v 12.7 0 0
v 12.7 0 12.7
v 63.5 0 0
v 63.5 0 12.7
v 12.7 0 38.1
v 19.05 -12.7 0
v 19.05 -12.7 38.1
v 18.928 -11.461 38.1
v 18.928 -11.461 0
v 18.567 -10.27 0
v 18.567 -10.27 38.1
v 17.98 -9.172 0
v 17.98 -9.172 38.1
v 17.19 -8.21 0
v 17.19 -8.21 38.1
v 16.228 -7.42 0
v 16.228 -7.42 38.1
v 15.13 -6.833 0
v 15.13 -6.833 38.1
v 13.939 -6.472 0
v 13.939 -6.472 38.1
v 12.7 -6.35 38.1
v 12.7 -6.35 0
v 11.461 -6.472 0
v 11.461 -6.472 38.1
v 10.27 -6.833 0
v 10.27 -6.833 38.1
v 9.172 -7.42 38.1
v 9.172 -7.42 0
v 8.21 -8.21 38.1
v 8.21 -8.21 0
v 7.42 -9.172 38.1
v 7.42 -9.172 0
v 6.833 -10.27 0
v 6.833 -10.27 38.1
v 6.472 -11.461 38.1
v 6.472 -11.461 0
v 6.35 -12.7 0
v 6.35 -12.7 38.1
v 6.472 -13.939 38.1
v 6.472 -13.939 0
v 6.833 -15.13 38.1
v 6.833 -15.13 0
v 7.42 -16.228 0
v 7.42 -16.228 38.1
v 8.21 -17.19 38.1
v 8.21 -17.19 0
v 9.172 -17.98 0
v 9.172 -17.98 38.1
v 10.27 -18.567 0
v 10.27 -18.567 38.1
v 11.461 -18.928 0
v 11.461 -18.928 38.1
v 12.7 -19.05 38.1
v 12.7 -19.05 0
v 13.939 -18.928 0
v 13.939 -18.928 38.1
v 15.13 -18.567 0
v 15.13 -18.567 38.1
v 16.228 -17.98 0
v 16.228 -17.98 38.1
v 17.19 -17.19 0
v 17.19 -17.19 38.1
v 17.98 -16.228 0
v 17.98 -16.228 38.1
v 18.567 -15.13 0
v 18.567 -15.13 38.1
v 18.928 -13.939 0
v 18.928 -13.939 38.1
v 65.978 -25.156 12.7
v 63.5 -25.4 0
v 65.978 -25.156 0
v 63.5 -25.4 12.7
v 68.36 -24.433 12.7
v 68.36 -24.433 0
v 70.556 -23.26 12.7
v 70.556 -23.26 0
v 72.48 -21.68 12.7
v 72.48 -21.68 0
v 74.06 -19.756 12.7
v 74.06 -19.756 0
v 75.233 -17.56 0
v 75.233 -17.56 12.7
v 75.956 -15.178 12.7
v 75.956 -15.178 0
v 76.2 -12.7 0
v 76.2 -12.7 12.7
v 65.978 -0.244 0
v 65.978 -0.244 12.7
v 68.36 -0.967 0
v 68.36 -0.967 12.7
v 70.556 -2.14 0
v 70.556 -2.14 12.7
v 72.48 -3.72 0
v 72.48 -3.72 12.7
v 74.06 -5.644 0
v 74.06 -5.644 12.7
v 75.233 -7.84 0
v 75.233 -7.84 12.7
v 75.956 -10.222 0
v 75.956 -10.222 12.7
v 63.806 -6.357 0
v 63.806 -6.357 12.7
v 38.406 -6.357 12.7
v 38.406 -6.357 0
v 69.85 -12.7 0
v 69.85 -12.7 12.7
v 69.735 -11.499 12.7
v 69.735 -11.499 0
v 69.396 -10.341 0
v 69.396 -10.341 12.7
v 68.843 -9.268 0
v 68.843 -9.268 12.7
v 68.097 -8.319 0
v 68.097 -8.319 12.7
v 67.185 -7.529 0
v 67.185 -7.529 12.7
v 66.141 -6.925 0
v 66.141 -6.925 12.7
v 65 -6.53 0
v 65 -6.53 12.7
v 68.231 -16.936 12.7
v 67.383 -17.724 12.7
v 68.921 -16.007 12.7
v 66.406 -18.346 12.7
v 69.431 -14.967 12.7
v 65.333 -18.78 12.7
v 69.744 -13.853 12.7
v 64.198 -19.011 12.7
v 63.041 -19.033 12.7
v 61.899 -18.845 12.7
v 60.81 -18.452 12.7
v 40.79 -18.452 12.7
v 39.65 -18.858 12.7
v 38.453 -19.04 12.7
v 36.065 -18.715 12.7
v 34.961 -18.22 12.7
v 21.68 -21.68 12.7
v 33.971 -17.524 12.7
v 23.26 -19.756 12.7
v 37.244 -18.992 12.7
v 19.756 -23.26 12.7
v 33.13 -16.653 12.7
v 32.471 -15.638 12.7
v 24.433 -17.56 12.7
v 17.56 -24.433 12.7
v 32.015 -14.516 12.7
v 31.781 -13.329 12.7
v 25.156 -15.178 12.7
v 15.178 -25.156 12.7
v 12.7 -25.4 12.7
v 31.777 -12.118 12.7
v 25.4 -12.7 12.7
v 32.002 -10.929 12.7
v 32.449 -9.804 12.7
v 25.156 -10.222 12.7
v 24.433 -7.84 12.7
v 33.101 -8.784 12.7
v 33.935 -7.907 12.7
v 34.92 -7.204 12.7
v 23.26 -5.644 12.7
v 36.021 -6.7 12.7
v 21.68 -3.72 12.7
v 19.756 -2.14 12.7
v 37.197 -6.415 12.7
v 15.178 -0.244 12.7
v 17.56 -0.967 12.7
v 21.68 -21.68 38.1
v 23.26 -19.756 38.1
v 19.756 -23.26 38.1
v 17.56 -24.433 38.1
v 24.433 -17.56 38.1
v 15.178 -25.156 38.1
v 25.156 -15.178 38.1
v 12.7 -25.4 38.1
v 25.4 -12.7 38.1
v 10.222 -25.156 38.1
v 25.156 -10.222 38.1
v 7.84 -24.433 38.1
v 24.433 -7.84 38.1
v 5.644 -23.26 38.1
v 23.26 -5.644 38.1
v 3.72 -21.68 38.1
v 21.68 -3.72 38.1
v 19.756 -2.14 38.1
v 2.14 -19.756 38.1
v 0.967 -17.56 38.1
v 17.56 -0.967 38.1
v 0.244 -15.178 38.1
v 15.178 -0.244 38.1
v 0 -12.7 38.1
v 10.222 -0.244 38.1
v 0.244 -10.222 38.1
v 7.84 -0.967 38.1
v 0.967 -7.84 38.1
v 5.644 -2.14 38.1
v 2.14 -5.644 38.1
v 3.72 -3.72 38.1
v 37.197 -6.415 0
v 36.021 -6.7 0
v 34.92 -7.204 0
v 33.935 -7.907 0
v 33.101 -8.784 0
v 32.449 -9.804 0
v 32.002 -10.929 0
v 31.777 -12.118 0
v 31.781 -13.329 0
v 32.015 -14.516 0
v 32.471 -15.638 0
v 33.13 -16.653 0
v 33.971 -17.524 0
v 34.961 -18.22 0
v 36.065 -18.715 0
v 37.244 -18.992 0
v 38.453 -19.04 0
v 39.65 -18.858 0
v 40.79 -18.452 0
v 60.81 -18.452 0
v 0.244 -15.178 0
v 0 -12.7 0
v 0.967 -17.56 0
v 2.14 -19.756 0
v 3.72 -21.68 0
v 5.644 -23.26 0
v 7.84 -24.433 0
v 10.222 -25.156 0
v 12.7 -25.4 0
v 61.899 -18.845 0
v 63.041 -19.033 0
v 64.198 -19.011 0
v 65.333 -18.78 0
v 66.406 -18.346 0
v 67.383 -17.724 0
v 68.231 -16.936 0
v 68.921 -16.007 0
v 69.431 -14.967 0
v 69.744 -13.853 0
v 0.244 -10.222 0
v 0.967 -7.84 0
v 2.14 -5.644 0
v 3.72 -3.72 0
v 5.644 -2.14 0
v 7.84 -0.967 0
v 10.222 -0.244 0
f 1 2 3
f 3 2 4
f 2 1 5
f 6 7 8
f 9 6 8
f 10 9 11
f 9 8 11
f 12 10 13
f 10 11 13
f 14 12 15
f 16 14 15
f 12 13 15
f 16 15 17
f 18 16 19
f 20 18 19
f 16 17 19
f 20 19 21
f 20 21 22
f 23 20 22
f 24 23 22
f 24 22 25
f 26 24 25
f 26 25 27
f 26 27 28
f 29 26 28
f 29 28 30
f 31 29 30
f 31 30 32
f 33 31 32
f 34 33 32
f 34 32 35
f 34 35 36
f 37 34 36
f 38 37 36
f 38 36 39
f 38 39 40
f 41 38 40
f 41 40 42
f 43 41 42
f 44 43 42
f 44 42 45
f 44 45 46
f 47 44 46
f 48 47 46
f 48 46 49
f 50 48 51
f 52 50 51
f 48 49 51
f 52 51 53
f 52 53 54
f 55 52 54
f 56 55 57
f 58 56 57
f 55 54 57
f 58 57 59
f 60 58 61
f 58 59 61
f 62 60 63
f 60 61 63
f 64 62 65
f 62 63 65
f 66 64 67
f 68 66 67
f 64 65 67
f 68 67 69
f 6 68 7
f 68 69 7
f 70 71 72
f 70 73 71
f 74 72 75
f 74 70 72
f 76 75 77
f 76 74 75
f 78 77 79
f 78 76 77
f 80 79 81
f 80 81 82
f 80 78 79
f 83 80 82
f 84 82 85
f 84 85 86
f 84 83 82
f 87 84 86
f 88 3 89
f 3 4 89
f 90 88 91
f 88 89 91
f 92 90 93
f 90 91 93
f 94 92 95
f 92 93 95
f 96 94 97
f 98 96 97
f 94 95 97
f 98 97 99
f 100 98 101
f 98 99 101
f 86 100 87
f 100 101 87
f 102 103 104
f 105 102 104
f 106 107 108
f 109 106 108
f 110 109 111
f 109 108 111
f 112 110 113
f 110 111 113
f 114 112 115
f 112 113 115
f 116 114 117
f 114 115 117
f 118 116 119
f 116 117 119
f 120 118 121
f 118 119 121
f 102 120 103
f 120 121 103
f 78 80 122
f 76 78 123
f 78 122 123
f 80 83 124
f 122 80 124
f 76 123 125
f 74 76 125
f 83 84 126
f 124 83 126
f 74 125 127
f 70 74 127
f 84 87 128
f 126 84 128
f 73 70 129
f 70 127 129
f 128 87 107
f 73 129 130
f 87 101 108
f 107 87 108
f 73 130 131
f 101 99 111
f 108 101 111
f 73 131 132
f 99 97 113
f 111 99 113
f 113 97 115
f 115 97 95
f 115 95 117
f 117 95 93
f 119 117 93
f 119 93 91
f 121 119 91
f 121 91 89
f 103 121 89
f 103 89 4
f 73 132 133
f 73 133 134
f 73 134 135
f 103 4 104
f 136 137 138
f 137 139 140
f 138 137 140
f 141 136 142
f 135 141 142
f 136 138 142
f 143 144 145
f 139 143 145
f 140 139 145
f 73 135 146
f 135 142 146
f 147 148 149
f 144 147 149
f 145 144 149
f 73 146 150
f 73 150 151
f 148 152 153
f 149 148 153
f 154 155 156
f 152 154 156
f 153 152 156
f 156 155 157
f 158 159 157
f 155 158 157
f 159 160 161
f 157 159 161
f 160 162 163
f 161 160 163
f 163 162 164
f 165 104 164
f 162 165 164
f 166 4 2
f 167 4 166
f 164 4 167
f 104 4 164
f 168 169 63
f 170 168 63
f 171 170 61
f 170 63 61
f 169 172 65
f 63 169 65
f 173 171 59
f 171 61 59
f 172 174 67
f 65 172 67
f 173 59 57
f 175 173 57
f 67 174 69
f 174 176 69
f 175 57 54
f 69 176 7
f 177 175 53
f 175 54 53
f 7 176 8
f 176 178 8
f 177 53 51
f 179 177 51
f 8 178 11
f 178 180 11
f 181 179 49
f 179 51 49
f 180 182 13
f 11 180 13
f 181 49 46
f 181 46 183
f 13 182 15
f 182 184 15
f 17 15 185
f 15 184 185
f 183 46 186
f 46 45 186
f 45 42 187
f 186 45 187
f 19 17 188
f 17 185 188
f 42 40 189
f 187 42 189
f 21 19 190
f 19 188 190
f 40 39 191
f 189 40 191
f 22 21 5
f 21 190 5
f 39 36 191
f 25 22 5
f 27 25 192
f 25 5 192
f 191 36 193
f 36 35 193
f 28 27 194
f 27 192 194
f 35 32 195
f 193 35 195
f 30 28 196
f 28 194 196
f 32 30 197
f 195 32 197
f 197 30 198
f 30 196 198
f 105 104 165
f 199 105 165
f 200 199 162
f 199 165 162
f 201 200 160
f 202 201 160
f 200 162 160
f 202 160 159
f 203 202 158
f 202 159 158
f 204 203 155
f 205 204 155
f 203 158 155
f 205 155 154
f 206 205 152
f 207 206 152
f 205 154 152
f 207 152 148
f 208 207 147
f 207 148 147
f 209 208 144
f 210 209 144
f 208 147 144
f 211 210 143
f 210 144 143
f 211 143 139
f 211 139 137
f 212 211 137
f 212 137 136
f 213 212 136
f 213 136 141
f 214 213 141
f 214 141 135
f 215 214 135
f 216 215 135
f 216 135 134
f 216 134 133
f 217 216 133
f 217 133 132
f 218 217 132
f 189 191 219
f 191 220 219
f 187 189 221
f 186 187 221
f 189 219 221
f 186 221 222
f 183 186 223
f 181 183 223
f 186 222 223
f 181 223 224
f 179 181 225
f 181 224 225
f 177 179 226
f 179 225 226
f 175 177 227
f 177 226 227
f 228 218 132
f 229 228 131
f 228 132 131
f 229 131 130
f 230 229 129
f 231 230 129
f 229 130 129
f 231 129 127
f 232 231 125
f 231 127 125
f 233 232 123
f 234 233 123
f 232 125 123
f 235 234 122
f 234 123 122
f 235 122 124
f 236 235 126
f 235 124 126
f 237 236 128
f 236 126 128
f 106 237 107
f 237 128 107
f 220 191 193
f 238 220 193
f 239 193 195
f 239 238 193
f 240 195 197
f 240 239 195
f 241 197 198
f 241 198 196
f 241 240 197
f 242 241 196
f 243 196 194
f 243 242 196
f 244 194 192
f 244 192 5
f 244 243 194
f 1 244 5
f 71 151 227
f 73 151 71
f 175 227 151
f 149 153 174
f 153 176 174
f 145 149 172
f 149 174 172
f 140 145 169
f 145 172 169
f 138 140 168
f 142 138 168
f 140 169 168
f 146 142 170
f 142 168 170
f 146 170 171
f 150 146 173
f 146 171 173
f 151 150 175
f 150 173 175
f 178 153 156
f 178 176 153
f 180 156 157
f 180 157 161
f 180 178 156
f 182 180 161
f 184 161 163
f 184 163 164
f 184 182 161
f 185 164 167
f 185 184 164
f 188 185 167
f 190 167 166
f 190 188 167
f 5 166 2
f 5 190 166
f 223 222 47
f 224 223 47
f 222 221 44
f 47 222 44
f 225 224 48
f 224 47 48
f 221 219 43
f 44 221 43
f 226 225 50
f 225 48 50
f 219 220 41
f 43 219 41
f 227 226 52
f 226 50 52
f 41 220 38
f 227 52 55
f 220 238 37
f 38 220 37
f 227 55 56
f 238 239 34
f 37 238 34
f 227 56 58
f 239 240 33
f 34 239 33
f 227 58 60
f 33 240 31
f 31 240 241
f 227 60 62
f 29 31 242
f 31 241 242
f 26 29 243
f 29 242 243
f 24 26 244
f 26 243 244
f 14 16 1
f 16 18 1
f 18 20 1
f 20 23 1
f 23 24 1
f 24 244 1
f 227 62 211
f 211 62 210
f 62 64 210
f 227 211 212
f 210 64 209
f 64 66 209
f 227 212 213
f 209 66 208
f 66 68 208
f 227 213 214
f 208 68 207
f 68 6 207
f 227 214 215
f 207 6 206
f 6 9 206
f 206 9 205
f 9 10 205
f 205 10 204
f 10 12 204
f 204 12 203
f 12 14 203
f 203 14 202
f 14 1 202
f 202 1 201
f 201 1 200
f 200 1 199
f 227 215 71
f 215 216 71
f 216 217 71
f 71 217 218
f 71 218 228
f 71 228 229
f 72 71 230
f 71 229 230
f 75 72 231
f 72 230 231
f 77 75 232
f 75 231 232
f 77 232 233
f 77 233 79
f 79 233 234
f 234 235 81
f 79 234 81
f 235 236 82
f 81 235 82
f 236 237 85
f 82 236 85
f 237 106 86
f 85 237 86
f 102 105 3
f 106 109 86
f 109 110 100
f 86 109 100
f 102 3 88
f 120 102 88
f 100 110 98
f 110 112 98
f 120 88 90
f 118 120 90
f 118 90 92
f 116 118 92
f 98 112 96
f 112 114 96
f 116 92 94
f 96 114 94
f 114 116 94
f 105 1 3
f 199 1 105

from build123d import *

# Parameters (mm, degrees)
F1_DEPTH = 25.4
F2_R     = 12.69999
F3_R     = 6.35
F4_DEPTH = 50.8
F5_R     = 12.69999
F6_R     = 6.35
F8_DEPTH = 25.4


# Not quite as in the source:
# - a fillet or chamfer is up to 0.001 mm smaller than in the source, because OpenCascade refuses the exact size


with BuildPart() as f1:
    # F0 (on Front) → F1 (new body)
    with BuildSketch(Plane.XZ):
        Polygon((0, 38.1), (0, 0), (76.2, 0), (76.2, 12.7), (25.4, 12.7), (25.4, 38.1), align=None)
    extrude(amount=F1_DEPTH)

    # F2 (radius 12.7 in the source; OpenCascade refuses exactly that, so slightly less here)
    f2_edges = [f1.edges().sort_by_distance(p)[0] for p in [
        (25.4, 0, 25.4),
        (25.4, -25.4, 25.4),
        (0, -25.4, 19.05),
        (0, 0, 19.05),
    ]]
    fillet(f2_edges, radius=F2_R)

    # F3 (on face) → F4 (cut)
    with BuildSketch(Plane.XY.offset(38.1)):
        with Locations((12.7, -12.7)):
            Circle(F3_R)
    extrude(amount=-F4_DEPTH, mode=Mode.SUBTRACT)

    # F5 (radius 12.7 in the source; OpenCascade refuses exactly that, so slightly less here)
    f5_edges = [f1.edges().sort_by_distance(p)[0] for p in [
        (76.2, 0, 6.35),
        (76.2, -25.4, 6.35),
    ]]
    fillet(f5_edges, radius=F5_R)

    # F6 (on face) + F7 (on face) → F8 (cut)
    with BuildSketch(Plane.XY.offset(12.7)):
        with Locations((38.1, -12.7)):
            Circle(F6_R)
    with BuildSketch(Plane.XY.offset(12.7)):
        with BuildLine():
            Line((40.7903380557, -18.4519197792), (60.8096619443, -18.4519197792))
            ThreePointArc((60.8096619443, -18.4519197792), (57.2698982045, -11.4718584702), (63.1938608334, -6.3573839143))
            Line((63.1938608334, -6.3573839143), (38.4061391666, -6.3573839143))
            ThreePointArc((38.4061391666, -6.3573839143), (42.6970905858, -8.3194454522), (44.45, -12.7))
            ThreePointArc((44.45, -12.7), (43.4575249254, -16.108728014), (40.7903380557, -18.4519197792))
        make_face()
        with BuildLine():
            ThreePointArc((63.1938608334, -6.3573839143), (57.2698982045, -11.4718584702), (60.8096619443, -18.4519197792))
            ThreePointArc((60.8096619443, -18.4519197792), (66.908728014, -18.0575249254), (69.85, -12.7))
            ThreePointArc((69.85, -12.7), (68.0970905858, -8.3194454522), (63.8061391666, -6.3573839143))
            Line((63.8061391666, -6.3573839143), (63.1938608334, -6.3573839143))
        make_face()
    extrude(amount=-F8_DEPTH, mode=Mode.SUBTRACT)


solid = f1.part
